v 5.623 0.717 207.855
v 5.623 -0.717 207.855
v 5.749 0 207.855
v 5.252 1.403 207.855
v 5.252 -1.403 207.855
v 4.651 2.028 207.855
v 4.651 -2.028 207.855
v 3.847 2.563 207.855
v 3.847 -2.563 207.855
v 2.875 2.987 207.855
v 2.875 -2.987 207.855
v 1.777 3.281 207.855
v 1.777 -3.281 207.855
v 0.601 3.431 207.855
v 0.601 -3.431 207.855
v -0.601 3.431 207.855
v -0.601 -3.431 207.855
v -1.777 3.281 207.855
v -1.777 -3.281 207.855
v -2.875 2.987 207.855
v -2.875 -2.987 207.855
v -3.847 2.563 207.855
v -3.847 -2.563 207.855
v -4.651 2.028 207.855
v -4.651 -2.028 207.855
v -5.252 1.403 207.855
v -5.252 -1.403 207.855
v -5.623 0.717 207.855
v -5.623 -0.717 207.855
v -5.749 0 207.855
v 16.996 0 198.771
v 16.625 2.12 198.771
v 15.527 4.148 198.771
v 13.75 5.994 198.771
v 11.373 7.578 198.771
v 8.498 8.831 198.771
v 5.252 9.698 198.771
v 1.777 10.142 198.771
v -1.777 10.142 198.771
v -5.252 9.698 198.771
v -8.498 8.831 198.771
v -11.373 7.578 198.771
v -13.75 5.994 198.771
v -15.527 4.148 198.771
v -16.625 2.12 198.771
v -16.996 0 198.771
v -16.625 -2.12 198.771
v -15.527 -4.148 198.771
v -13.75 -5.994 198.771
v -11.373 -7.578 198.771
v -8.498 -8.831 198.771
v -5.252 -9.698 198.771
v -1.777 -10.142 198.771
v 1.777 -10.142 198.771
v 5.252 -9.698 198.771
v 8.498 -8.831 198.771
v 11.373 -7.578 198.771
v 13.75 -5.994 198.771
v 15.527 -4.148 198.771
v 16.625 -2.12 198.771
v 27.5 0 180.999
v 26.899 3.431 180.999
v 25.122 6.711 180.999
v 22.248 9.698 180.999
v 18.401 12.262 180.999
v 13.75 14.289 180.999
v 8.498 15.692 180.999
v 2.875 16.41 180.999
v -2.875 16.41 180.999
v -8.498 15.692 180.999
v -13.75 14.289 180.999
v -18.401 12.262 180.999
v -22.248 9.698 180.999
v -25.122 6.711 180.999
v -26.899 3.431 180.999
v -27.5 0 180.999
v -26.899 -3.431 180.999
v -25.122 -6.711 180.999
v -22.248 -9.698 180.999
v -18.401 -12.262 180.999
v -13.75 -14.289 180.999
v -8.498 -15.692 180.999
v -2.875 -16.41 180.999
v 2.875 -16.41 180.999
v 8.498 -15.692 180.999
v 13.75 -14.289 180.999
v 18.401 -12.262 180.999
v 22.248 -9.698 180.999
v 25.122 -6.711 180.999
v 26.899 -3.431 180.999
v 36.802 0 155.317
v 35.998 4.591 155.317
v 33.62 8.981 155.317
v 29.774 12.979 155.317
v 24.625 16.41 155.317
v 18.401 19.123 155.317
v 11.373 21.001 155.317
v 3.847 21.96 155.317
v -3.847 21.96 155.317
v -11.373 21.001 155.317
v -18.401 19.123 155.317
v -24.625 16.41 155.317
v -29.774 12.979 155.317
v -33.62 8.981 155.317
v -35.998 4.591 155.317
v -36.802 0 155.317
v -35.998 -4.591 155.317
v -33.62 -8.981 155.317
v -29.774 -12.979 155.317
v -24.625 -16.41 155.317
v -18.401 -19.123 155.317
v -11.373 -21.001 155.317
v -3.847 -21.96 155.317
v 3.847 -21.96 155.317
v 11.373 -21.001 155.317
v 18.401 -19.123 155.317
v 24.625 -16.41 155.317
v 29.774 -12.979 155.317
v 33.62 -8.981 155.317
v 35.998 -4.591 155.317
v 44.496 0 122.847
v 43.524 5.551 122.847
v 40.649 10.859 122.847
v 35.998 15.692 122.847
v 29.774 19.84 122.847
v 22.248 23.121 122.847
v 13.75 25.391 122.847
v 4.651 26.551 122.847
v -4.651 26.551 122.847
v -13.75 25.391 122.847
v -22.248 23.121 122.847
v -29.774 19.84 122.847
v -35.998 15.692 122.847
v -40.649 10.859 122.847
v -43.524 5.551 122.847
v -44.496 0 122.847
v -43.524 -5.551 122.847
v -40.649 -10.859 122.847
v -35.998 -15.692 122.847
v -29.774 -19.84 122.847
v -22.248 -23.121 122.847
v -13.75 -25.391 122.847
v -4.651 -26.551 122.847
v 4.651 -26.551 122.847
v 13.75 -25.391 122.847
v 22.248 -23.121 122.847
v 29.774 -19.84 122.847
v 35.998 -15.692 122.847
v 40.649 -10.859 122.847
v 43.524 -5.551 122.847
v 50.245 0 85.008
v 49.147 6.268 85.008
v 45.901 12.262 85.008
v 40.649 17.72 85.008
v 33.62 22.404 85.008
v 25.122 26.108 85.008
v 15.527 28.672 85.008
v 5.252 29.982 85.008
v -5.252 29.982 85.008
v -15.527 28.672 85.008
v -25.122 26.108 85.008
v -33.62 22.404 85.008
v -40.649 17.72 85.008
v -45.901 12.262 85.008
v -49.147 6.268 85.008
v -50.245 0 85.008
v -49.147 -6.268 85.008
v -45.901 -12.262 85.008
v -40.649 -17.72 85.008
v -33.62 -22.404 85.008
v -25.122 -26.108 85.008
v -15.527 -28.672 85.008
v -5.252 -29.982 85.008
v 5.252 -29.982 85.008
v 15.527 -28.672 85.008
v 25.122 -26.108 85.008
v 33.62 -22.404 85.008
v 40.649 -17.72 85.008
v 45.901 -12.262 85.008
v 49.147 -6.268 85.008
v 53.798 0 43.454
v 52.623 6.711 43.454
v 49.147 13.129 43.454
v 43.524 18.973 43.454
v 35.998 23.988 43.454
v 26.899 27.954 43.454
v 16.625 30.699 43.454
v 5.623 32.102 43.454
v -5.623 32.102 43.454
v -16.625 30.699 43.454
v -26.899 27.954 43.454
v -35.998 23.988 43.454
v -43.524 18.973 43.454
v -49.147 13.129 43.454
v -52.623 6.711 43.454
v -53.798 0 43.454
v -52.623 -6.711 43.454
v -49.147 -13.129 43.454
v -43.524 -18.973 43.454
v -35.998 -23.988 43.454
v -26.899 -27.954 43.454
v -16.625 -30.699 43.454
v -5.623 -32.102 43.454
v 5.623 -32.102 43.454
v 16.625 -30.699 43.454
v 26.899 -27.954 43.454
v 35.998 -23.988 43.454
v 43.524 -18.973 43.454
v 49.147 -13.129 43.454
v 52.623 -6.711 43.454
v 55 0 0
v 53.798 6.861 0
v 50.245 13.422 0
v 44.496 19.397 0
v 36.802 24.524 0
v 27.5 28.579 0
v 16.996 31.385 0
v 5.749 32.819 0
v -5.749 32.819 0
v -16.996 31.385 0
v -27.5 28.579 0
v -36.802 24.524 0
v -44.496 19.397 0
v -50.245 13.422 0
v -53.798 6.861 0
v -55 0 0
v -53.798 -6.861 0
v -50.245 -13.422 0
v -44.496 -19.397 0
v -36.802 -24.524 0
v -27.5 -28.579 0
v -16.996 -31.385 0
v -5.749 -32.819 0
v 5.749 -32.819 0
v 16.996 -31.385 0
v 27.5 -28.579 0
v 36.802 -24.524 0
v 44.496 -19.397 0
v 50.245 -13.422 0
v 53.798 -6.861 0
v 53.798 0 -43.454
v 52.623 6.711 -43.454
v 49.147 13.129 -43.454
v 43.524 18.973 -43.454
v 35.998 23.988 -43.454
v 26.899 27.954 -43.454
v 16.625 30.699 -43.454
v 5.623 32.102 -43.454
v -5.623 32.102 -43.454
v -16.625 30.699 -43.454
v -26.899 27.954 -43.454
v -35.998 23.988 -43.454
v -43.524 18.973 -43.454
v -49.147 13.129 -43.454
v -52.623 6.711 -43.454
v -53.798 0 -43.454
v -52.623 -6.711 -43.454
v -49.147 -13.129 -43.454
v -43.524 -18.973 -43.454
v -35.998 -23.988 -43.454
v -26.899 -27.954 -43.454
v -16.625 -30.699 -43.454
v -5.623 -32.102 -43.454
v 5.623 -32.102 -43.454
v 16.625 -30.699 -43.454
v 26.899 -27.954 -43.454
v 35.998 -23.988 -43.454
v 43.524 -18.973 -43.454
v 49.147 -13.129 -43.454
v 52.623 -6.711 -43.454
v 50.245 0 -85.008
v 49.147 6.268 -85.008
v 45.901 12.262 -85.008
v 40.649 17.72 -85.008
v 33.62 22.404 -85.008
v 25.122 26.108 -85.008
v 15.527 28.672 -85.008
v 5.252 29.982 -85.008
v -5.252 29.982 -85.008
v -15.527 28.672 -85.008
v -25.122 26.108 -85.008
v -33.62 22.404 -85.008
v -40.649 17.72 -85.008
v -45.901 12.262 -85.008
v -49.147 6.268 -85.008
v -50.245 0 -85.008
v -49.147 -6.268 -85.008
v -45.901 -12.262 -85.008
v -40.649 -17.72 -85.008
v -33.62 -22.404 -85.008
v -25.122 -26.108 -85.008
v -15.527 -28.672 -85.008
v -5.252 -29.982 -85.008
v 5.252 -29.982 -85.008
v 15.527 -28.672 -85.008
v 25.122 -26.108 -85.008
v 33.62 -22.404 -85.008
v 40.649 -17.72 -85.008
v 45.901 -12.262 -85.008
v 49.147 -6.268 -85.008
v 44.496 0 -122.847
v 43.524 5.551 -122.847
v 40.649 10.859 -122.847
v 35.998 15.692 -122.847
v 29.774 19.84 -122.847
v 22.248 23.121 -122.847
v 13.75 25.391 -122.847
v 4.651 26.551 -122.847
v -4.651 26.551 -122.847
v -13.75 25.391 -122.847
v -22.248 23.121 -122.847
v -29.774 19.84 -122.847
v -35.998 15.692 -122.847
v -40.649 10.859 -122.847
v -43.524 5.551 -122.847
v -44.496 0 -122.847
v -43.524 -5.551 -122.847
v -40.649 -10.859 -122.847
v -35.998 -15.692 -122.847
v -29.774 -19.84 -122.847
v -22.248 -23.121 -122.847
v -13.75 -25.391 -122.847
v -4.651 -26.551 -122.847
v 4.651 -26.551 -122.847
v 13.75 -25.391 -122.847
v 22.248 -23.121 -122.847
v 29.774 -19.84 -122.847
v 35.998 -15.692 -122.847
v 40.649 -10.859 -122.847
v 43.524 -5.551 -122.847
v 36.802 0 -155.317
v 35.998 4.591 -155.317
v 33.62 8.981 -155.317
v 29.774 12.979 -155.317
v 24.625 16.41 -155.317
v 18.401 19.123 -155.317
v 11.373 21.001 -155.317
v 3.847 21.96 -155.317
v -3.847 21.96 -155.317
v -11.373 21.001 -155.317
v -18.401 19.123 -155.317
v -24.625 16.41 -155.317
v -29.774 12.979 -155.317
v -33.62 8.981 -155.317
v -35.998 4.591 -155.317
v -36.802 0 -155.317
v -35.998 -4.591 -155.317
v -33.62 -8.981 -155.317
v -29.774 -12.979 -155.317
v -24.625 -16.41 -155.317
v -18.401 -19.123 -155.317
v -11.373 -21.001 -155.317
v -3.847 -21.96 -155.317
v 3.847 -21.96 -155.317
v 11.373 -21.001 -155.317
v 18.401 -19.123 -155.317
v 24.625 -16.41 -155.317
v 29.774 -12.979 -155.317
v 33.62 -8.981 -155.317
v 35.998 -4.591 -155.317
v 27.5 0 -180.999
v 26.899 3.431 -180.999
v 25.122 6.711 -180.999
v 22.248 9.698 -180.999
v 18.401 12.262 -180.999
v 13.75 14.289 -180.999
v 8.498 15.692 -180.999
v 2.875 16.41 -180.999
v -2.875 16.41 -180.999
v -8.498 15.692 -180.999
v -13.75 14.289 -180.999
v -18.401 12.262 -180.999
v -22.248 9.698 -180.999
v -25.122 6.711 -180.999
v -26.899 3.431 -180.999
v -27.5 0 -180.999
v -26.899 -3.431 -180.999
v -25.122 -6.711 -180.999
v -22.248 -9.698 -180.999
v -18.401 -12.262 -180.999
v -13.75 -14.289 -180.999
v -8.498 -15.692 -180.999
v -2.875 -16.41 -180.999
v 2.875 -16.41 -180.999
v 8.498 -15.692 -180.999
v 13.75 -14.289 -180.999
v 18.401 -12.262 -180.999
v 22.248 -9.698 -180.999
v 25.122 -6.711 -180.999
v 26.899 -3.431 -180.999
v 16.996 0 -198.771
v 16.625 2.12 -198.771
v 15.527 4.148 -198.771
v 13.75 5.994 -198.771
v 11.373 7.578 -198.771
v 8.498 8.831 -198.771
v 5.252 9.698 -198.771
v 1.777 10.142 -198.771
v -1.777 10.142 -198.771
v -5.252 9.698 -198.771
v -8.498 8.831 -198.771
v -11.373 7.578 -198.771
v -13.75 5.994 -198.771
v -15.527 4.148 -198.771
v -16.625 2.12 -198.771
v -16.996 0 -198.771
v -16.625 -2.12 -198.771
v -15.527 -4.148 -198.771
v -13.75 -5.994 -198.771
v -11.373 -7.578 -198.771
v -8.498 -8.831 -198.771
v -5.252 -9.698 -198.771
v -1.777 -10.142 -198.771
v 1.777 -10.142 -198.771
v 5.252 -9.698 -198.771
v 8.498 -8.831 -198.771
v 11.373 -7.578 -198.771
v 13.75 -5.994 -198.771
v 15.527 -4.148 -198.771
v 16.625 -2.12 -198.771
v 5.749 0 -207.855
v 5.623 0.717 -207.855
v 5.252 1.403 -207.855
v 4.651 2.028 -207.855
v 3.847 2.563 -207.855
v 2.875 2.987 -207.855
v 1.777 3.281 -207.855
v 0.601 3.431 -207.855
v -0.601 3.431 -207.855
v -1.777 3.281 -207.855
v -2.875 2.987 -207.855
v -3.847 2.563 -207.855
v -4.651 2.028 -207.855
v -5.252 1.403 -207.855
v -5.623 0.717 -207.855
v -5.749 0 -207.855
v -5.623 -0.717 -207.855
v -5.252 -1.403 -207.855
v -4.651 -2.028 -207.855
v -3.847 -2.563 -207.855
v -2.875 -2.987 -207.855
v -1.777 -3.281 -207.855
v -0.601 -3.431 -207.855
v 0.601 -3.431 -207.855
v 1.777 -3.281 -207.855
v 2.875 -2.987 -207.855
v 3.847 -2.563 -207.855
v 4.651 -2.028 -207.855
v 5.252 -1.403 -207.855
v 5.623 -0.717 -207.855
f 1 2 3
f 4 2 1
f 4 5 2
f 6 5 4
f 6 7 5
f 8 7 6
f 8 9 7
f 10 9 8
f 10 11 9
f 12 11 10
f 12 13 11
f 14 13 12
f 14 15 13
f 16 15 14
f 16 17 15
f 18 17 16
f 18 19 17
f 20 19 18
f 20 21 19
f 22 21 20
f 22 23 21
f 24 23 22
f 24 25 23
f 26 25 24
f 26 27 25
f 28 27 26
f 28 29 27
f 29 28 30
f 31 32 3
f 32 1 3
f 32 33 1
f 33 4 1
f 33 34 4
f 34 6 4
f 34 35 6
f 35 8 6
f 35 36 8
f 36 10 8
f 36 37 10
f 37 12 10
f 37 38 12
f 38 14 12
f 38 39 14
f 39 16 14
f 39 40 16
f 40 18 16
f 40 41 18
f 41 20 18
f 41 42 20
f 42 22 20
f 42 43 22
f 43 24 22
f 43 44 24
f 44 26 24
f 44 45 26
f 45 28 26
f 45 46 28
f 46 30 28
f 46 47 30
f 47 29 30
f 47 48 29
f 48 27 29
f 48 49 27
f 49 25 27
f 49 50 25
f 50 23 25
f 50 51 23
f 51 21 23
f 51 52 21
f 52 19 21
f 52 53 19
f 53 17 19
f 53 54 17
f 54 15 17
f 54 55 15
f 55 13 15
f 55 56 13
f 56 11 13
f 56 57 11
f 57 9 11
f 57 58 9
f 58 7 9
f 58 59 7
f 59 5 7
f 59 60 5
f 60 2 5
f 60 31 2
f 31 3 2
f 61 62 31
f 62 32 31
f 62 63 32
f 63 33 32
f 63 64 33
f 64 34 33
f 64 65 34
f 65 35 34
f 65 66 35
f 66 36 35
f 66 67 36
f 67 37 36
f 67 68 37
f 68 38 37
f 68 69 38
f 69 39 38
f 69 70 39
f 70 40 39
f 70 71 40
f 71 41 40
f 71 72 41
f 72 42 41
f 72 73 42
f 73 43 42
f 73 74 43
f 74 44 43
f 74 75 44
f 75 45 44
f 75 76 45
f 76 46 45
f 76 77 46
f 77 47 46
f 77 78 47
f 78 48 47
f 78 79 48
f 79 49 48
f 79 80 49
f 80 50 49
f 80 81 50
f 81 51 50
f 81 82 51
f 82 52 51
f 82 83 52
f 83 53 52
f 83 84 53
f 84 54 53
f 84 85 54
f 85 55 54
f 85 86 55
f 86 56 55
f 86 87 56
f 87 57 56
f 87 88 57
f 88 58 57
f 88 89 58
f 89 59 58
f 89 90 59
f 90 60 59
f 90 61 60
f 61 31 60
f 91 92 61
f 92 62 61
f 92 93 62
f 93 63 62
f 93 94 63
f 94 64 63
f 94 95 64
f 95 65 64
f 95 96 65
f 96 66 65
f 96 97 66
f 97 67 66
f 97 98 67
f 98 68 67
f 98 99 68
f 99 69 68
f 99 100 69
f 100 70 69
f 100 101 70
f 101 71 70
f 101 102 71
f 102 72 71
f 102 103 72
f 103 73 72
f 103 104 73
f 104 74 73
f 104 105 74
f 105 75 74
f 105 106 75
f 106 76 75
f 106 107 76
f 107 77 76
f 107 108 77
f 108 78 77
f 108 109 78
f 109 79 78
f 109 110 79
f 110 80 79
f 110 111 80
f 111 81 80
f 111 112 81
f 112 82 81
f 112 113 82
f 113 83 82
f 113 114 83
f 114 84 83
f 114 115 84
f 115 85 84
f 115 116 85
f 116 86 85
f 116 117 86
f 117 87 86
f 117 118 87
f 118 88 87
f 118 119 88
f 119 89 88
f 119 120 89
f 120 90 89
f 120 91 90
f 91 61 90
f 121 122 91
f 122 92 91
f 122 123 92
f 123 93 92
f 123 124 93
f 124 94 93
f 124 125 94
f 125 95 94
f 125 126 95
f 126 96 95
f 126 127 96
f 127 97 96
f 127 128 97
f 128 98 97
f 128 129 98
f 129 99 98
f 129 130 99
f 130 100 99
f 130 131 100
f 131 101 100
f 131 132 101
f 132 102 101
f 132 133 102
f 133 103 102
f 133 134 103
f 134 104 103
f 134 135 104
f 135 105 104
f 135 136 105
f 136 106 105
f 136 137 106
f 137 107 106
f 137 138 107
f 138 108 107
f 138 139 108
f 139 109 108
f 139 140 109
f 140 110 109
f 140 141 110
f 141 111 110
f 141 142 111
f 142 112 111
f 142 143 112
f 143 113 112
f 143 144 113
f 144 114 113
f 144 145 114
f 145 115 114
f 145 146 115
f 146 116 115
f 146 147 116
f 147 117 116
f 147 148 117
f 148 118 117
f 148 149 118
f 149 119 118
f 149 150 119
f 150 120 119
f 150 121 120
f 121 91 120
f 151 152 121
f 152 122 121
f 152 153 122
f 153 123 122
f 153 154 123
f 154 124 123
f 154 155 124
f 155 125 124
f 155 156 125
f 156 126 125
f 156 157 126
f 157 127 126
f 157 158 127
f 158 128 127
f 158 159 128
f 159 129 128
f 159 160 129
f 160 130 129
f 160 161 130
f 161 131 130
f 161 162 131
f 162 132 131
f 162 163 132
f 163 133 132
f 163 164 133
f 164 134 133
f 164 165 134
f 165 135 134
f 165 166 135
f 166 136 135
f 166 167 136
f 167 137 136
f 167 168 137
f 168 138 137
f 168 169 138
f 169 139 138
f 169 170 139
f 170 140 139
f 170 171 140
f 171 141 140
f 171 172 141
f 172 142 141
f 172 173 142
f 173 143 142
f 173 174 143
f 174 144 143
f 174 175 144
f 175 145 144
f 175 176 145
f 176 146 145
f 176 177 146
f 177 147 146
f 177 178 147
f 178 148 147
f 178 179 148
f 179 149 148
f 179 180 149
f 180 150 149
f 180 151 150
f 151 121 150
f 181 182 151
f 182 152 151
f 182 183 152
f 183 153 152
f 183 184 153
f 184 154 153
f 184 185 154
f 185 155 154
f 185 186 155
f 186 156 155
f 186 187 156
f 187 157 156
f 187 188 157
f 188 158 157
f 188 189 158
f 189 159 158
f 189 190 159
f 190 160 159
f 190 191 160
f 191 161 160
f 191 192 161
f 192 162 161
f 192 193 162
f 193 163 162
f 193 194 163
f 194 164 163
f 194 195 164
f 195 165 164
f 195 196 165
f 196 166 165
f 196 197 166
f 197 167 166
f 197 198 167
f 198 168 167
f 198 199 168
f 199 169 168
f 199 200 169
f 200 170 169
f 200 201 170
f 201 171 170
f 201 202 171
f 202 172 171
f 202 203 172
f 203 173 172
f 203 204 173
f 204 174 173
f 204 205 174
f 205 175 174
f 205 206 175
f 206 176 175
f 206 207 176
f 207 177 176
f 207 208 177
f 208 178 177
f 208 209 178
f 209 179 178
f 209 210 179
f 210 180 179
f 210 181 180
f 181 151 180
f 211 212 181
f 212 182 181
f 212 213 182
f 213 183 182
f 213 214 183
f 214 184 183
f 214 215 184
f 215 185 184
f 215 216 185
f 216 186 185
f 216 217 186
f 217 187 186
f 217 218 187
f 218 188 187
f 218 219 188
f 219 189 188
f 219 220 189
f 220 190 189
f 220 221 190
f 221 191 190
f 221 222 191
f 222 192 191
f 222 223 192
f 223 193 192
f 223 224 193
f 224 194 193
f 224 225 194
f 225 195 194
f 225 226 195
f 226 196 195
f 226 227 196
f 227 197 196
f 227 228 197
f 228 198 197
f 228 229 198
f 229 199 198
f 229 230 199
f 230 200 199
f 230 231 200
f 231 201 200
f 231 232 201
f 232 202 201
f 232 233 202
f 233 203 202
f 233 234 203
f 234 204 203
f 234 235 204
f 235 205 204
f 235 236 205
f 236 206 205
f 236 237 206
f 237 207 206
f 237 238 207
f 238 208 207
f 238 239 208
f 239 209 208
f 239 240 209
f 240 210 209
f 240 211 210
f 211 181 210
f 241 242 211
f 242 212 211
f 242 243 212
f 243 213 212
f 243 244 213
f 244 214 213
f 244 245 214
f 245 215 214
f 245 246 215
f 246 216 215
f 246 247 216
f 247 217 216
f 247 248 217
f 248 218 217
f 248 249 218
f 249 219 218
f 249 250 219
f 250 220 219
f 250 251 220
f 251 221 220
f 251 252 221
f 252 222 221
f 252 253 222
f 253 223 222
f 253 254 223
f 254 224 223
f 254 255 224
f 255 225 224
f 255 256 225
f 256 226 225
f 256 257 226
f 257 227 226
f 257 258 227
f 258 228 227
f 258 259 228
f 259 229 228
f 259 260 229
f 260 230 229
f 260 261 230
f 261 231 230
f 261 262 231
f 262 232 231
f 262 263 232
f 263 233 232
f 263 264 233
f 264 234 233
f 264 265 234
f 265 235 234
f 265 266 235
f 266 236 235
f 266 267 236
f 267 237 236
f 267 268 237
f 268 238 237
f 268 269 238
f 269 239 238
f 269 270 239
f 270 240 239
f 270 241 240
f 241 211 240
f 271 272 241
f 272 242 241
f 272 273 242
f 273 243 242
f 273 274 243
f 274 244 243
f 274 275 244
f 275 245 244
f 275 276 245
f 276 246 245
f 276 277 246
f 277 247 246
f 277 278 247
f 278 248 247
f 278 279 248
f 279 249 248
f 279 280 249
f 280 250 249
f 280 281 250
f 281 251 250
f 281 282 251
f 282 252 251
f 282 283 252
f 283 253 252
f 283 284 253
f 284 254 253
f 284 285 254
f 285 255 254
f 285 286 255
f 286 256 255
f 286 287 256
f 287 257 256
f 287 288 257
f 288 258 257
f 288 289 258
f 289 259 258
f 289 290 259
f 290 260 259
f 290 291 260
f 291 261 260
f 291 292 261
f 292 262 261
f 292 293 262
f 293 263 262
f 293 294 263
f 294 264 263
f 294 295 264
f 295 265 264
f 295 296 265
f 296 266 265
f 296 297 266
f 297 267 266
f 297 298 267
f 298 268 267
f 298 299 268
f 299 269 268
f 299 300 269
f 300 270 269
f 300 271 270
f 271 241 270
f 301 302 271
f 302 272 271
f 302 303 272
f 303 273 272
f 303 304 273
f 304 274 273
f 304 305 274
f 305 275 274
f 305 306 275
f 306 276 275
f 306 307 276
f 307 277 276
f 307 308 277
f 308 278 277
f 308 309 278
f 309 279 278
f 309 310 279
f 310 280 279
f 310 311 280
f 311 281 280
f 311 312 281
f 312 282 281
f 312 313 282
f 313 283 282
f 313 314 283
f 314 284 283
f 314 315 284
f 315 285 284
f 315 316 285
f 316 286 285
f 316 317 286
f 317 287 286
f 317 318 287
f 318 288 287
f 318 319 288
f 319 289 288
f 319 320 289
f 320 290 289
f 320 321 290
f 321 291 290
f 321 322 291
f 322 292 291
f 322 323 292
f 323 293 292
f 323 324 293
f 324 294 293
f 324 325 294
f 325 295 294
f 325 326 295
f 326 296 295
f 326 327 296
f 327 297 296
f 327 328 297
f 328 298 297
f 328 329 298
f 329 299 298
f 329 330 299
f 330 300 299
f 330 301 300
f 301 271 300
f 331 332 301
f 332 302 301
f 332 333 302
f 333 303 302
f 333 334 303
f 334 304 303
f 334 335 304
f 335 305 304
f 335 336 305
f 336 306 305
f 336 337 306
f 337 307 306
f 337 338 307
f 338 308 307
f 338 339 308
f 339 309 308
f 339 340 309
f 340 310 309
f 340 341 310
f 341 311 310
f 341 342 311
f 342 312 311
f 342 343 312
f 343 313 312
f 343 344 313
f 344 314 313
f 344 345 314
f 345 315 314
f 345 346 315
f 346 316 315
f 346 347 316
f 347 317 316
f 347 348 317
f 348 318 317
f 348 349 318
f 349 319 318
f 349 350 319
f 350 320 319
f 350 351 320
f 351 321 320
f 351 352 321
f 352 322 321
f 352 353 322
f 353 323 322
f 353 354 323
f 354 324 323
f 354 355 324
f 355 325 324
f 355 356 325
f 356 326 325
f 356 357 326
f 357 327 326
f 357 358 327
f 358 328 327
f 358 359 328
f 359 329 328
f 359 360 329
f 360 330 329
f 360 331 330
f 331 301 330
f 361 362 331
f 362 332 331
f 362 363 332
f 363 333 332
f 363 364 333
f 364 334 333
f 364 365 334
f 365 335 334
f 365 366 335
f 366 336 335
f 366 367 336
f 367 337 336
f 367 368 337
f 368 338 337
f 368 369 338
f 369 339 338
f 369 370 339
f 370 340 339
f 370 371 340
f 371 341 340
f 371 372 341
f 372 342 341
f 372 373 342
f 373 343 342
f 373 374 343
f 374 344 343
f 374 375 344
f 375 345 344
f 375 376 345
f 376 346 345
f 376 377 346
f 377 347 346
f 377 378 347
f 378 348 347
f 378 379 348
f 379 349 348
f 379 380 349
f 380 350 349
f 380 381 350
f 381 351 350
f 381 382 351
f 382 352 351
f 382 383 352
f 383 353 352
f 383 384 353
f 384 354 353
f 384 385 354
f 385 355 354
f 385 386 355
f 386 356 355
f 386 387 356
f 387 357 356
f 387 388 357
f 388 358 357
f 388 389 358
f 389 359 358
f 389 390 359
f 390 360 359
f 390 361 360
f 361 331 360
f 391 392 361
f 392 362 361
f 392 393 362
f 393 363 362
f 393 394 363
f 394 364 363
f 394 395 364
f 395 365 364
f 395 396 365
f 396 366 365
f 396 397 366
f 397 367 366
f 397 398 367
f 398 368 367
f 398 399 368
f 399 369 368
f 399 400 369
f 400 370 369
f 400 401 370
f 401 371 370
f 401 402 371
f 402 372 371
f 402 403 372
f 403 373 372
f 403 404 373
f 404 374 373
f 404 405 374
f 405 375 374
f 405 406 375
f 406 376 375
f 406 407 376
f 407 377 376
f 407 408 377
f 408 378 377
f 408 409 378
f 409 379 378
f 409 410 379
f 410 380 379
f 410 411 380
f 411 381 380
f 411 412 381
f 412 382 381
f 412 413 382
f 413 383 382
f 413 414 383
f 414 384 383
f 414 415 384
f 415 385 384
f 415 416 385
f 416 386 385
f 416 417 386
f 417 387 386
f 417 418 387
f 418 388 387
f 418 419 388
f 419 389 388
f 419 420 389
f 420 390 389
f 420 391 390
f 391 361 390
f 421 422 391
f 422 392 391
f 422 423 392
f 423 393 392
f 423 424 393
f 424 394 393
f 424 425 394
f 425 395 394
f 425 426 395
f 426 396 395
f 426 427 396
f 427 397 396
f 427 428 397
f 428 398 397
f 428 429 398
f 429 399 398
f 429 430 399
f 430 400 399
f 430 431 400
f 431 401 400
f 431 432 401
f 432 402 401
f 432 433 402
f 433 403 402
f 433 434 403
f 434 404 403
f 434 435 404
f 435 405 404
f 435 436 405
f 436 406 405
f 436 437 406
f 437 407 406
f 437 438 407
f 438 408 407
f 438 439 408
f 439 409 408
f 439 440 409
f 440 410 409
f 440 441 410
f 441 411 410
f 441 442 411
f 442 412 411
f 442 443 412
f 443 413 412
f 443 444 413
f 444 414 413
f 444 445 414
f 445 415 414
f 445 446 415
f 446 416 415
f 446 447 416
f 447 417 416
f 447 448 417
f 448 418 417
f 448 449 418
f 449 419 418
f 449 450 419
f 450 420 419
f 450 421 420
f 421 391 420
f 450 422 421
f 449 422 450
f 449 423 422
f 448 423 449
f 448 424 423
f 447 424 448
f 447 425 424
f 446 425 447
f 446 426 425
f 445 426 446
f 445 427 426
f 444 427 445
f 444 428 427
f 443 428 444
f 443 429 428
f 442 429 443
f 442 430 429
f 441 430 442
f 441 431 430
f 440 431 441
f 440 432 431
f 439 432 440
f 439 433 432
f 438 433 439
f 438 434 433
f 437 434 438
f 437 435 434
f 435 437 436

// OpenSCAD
// Generated by SolidPython 1.0.1 on 2020-07-29 00:46:46


scale(v = [5, 3, 19]) {
	sphere(r = 11);
}
/***********************************************
*********      SolidPython code:      **********
************************************************
 
# import packages: SolidPython
from solid import *
from solid.utils import *
from itertools import chain, combinations, permutations


class Resize:

    def __init__(self, scad_file):
        self.scad_file = scad_file
        #self.scad_file = import_scad(scad_file)
        # cone/cylinder param:
        self.r1 = 0
        self.r2 = 0
        self.h = 0
        # rectangular prism param:
        self.w = 0
        self.l = 0
        # ellipse param:
        self.r = 0

    # import OpenScad code (file name corresponds to shape)


    # classify shape + parameters
    def assign(self, param1, param2, param3):
        if self.scad_file == 'cone.scad':
            self.r1 = param1
            self.r2 = param2
            self.h = param3
        elif self.scad_file == 'cylinder.scad':
            self.r1 = param1
            self.r2 = param2
            self.h = param3
        elif self.scad_file == 'rectangularPrism.scad':
            self.h = param1
            self.l = param2
            self.w = param3
        else:
            self.r = param1
            self.h = param2

    # resize parameters
    def iterate(self):
        x = range(3, 20, 2)
        i = 1
        if self.scad_file == 'cone.scad':
            tempList = list(permutations(x, 2))
            for temp in tempList:
                param1 = temp[0]
                param2 = temp[1]
                filepath = 'produced_scad_files/' + 'cone' + str(param1) + '_' + str(param2) + '_' + '.scad'
                scad_render_to_file(cylinder(h=param1, r1=param2, r2=0), filepath)

        elif self.scad_file == 'cylinder.scad':
            tempList = list(permutations(x, 3))
            for temp in tempList:
                param1 = temp[0]
                param2 = temp[1]
                filepath = 'produced_scad_files/' + 'cylinder' + str(param1) + '_' + str(param2) + '_' + '.scad'
                scad_render_to_file(cylinder(h=param1, r1=param2, r2=param2), filepath)

        elif self.scad_file == 'rectangularPrism.scad':
            tempList = list(permutations(x, 3))
            for temp in tempList:
                param1 = temp[0]
                param2 = temp[1]
                param3 = temp[2]
                filepath = 'produced_scad_files/' + 'rectangularPrism' + str(param1) + '_' + str(param2) + '_' + str(
                    param3) + '.scad'
                scad_render_to_file(cube(size=(param1, param2, param3)), filepath)

        elif self.scad_file == 'ellipse.scad':
            tempList = list(permutations(x, 4))
            for temp in tempList:
                param1 = temp[0]
                param2 = temp[1]
                param3 = temp[2]
                param4 = temp[3]
                filepath = 'produced_scad_files/' + 'ellipse' + str(param1) + '_' + str(param2) + '_' + str(param3) + '_' + str(param4) + '.scad'
                scad_render_to_file(scale([param1, param2, param3])(sphere(r=param4)), filepath)

    def render_to_scadfile(self):
        scad_render_to_file(scad, 'example.scad') 
 
************************************************/
